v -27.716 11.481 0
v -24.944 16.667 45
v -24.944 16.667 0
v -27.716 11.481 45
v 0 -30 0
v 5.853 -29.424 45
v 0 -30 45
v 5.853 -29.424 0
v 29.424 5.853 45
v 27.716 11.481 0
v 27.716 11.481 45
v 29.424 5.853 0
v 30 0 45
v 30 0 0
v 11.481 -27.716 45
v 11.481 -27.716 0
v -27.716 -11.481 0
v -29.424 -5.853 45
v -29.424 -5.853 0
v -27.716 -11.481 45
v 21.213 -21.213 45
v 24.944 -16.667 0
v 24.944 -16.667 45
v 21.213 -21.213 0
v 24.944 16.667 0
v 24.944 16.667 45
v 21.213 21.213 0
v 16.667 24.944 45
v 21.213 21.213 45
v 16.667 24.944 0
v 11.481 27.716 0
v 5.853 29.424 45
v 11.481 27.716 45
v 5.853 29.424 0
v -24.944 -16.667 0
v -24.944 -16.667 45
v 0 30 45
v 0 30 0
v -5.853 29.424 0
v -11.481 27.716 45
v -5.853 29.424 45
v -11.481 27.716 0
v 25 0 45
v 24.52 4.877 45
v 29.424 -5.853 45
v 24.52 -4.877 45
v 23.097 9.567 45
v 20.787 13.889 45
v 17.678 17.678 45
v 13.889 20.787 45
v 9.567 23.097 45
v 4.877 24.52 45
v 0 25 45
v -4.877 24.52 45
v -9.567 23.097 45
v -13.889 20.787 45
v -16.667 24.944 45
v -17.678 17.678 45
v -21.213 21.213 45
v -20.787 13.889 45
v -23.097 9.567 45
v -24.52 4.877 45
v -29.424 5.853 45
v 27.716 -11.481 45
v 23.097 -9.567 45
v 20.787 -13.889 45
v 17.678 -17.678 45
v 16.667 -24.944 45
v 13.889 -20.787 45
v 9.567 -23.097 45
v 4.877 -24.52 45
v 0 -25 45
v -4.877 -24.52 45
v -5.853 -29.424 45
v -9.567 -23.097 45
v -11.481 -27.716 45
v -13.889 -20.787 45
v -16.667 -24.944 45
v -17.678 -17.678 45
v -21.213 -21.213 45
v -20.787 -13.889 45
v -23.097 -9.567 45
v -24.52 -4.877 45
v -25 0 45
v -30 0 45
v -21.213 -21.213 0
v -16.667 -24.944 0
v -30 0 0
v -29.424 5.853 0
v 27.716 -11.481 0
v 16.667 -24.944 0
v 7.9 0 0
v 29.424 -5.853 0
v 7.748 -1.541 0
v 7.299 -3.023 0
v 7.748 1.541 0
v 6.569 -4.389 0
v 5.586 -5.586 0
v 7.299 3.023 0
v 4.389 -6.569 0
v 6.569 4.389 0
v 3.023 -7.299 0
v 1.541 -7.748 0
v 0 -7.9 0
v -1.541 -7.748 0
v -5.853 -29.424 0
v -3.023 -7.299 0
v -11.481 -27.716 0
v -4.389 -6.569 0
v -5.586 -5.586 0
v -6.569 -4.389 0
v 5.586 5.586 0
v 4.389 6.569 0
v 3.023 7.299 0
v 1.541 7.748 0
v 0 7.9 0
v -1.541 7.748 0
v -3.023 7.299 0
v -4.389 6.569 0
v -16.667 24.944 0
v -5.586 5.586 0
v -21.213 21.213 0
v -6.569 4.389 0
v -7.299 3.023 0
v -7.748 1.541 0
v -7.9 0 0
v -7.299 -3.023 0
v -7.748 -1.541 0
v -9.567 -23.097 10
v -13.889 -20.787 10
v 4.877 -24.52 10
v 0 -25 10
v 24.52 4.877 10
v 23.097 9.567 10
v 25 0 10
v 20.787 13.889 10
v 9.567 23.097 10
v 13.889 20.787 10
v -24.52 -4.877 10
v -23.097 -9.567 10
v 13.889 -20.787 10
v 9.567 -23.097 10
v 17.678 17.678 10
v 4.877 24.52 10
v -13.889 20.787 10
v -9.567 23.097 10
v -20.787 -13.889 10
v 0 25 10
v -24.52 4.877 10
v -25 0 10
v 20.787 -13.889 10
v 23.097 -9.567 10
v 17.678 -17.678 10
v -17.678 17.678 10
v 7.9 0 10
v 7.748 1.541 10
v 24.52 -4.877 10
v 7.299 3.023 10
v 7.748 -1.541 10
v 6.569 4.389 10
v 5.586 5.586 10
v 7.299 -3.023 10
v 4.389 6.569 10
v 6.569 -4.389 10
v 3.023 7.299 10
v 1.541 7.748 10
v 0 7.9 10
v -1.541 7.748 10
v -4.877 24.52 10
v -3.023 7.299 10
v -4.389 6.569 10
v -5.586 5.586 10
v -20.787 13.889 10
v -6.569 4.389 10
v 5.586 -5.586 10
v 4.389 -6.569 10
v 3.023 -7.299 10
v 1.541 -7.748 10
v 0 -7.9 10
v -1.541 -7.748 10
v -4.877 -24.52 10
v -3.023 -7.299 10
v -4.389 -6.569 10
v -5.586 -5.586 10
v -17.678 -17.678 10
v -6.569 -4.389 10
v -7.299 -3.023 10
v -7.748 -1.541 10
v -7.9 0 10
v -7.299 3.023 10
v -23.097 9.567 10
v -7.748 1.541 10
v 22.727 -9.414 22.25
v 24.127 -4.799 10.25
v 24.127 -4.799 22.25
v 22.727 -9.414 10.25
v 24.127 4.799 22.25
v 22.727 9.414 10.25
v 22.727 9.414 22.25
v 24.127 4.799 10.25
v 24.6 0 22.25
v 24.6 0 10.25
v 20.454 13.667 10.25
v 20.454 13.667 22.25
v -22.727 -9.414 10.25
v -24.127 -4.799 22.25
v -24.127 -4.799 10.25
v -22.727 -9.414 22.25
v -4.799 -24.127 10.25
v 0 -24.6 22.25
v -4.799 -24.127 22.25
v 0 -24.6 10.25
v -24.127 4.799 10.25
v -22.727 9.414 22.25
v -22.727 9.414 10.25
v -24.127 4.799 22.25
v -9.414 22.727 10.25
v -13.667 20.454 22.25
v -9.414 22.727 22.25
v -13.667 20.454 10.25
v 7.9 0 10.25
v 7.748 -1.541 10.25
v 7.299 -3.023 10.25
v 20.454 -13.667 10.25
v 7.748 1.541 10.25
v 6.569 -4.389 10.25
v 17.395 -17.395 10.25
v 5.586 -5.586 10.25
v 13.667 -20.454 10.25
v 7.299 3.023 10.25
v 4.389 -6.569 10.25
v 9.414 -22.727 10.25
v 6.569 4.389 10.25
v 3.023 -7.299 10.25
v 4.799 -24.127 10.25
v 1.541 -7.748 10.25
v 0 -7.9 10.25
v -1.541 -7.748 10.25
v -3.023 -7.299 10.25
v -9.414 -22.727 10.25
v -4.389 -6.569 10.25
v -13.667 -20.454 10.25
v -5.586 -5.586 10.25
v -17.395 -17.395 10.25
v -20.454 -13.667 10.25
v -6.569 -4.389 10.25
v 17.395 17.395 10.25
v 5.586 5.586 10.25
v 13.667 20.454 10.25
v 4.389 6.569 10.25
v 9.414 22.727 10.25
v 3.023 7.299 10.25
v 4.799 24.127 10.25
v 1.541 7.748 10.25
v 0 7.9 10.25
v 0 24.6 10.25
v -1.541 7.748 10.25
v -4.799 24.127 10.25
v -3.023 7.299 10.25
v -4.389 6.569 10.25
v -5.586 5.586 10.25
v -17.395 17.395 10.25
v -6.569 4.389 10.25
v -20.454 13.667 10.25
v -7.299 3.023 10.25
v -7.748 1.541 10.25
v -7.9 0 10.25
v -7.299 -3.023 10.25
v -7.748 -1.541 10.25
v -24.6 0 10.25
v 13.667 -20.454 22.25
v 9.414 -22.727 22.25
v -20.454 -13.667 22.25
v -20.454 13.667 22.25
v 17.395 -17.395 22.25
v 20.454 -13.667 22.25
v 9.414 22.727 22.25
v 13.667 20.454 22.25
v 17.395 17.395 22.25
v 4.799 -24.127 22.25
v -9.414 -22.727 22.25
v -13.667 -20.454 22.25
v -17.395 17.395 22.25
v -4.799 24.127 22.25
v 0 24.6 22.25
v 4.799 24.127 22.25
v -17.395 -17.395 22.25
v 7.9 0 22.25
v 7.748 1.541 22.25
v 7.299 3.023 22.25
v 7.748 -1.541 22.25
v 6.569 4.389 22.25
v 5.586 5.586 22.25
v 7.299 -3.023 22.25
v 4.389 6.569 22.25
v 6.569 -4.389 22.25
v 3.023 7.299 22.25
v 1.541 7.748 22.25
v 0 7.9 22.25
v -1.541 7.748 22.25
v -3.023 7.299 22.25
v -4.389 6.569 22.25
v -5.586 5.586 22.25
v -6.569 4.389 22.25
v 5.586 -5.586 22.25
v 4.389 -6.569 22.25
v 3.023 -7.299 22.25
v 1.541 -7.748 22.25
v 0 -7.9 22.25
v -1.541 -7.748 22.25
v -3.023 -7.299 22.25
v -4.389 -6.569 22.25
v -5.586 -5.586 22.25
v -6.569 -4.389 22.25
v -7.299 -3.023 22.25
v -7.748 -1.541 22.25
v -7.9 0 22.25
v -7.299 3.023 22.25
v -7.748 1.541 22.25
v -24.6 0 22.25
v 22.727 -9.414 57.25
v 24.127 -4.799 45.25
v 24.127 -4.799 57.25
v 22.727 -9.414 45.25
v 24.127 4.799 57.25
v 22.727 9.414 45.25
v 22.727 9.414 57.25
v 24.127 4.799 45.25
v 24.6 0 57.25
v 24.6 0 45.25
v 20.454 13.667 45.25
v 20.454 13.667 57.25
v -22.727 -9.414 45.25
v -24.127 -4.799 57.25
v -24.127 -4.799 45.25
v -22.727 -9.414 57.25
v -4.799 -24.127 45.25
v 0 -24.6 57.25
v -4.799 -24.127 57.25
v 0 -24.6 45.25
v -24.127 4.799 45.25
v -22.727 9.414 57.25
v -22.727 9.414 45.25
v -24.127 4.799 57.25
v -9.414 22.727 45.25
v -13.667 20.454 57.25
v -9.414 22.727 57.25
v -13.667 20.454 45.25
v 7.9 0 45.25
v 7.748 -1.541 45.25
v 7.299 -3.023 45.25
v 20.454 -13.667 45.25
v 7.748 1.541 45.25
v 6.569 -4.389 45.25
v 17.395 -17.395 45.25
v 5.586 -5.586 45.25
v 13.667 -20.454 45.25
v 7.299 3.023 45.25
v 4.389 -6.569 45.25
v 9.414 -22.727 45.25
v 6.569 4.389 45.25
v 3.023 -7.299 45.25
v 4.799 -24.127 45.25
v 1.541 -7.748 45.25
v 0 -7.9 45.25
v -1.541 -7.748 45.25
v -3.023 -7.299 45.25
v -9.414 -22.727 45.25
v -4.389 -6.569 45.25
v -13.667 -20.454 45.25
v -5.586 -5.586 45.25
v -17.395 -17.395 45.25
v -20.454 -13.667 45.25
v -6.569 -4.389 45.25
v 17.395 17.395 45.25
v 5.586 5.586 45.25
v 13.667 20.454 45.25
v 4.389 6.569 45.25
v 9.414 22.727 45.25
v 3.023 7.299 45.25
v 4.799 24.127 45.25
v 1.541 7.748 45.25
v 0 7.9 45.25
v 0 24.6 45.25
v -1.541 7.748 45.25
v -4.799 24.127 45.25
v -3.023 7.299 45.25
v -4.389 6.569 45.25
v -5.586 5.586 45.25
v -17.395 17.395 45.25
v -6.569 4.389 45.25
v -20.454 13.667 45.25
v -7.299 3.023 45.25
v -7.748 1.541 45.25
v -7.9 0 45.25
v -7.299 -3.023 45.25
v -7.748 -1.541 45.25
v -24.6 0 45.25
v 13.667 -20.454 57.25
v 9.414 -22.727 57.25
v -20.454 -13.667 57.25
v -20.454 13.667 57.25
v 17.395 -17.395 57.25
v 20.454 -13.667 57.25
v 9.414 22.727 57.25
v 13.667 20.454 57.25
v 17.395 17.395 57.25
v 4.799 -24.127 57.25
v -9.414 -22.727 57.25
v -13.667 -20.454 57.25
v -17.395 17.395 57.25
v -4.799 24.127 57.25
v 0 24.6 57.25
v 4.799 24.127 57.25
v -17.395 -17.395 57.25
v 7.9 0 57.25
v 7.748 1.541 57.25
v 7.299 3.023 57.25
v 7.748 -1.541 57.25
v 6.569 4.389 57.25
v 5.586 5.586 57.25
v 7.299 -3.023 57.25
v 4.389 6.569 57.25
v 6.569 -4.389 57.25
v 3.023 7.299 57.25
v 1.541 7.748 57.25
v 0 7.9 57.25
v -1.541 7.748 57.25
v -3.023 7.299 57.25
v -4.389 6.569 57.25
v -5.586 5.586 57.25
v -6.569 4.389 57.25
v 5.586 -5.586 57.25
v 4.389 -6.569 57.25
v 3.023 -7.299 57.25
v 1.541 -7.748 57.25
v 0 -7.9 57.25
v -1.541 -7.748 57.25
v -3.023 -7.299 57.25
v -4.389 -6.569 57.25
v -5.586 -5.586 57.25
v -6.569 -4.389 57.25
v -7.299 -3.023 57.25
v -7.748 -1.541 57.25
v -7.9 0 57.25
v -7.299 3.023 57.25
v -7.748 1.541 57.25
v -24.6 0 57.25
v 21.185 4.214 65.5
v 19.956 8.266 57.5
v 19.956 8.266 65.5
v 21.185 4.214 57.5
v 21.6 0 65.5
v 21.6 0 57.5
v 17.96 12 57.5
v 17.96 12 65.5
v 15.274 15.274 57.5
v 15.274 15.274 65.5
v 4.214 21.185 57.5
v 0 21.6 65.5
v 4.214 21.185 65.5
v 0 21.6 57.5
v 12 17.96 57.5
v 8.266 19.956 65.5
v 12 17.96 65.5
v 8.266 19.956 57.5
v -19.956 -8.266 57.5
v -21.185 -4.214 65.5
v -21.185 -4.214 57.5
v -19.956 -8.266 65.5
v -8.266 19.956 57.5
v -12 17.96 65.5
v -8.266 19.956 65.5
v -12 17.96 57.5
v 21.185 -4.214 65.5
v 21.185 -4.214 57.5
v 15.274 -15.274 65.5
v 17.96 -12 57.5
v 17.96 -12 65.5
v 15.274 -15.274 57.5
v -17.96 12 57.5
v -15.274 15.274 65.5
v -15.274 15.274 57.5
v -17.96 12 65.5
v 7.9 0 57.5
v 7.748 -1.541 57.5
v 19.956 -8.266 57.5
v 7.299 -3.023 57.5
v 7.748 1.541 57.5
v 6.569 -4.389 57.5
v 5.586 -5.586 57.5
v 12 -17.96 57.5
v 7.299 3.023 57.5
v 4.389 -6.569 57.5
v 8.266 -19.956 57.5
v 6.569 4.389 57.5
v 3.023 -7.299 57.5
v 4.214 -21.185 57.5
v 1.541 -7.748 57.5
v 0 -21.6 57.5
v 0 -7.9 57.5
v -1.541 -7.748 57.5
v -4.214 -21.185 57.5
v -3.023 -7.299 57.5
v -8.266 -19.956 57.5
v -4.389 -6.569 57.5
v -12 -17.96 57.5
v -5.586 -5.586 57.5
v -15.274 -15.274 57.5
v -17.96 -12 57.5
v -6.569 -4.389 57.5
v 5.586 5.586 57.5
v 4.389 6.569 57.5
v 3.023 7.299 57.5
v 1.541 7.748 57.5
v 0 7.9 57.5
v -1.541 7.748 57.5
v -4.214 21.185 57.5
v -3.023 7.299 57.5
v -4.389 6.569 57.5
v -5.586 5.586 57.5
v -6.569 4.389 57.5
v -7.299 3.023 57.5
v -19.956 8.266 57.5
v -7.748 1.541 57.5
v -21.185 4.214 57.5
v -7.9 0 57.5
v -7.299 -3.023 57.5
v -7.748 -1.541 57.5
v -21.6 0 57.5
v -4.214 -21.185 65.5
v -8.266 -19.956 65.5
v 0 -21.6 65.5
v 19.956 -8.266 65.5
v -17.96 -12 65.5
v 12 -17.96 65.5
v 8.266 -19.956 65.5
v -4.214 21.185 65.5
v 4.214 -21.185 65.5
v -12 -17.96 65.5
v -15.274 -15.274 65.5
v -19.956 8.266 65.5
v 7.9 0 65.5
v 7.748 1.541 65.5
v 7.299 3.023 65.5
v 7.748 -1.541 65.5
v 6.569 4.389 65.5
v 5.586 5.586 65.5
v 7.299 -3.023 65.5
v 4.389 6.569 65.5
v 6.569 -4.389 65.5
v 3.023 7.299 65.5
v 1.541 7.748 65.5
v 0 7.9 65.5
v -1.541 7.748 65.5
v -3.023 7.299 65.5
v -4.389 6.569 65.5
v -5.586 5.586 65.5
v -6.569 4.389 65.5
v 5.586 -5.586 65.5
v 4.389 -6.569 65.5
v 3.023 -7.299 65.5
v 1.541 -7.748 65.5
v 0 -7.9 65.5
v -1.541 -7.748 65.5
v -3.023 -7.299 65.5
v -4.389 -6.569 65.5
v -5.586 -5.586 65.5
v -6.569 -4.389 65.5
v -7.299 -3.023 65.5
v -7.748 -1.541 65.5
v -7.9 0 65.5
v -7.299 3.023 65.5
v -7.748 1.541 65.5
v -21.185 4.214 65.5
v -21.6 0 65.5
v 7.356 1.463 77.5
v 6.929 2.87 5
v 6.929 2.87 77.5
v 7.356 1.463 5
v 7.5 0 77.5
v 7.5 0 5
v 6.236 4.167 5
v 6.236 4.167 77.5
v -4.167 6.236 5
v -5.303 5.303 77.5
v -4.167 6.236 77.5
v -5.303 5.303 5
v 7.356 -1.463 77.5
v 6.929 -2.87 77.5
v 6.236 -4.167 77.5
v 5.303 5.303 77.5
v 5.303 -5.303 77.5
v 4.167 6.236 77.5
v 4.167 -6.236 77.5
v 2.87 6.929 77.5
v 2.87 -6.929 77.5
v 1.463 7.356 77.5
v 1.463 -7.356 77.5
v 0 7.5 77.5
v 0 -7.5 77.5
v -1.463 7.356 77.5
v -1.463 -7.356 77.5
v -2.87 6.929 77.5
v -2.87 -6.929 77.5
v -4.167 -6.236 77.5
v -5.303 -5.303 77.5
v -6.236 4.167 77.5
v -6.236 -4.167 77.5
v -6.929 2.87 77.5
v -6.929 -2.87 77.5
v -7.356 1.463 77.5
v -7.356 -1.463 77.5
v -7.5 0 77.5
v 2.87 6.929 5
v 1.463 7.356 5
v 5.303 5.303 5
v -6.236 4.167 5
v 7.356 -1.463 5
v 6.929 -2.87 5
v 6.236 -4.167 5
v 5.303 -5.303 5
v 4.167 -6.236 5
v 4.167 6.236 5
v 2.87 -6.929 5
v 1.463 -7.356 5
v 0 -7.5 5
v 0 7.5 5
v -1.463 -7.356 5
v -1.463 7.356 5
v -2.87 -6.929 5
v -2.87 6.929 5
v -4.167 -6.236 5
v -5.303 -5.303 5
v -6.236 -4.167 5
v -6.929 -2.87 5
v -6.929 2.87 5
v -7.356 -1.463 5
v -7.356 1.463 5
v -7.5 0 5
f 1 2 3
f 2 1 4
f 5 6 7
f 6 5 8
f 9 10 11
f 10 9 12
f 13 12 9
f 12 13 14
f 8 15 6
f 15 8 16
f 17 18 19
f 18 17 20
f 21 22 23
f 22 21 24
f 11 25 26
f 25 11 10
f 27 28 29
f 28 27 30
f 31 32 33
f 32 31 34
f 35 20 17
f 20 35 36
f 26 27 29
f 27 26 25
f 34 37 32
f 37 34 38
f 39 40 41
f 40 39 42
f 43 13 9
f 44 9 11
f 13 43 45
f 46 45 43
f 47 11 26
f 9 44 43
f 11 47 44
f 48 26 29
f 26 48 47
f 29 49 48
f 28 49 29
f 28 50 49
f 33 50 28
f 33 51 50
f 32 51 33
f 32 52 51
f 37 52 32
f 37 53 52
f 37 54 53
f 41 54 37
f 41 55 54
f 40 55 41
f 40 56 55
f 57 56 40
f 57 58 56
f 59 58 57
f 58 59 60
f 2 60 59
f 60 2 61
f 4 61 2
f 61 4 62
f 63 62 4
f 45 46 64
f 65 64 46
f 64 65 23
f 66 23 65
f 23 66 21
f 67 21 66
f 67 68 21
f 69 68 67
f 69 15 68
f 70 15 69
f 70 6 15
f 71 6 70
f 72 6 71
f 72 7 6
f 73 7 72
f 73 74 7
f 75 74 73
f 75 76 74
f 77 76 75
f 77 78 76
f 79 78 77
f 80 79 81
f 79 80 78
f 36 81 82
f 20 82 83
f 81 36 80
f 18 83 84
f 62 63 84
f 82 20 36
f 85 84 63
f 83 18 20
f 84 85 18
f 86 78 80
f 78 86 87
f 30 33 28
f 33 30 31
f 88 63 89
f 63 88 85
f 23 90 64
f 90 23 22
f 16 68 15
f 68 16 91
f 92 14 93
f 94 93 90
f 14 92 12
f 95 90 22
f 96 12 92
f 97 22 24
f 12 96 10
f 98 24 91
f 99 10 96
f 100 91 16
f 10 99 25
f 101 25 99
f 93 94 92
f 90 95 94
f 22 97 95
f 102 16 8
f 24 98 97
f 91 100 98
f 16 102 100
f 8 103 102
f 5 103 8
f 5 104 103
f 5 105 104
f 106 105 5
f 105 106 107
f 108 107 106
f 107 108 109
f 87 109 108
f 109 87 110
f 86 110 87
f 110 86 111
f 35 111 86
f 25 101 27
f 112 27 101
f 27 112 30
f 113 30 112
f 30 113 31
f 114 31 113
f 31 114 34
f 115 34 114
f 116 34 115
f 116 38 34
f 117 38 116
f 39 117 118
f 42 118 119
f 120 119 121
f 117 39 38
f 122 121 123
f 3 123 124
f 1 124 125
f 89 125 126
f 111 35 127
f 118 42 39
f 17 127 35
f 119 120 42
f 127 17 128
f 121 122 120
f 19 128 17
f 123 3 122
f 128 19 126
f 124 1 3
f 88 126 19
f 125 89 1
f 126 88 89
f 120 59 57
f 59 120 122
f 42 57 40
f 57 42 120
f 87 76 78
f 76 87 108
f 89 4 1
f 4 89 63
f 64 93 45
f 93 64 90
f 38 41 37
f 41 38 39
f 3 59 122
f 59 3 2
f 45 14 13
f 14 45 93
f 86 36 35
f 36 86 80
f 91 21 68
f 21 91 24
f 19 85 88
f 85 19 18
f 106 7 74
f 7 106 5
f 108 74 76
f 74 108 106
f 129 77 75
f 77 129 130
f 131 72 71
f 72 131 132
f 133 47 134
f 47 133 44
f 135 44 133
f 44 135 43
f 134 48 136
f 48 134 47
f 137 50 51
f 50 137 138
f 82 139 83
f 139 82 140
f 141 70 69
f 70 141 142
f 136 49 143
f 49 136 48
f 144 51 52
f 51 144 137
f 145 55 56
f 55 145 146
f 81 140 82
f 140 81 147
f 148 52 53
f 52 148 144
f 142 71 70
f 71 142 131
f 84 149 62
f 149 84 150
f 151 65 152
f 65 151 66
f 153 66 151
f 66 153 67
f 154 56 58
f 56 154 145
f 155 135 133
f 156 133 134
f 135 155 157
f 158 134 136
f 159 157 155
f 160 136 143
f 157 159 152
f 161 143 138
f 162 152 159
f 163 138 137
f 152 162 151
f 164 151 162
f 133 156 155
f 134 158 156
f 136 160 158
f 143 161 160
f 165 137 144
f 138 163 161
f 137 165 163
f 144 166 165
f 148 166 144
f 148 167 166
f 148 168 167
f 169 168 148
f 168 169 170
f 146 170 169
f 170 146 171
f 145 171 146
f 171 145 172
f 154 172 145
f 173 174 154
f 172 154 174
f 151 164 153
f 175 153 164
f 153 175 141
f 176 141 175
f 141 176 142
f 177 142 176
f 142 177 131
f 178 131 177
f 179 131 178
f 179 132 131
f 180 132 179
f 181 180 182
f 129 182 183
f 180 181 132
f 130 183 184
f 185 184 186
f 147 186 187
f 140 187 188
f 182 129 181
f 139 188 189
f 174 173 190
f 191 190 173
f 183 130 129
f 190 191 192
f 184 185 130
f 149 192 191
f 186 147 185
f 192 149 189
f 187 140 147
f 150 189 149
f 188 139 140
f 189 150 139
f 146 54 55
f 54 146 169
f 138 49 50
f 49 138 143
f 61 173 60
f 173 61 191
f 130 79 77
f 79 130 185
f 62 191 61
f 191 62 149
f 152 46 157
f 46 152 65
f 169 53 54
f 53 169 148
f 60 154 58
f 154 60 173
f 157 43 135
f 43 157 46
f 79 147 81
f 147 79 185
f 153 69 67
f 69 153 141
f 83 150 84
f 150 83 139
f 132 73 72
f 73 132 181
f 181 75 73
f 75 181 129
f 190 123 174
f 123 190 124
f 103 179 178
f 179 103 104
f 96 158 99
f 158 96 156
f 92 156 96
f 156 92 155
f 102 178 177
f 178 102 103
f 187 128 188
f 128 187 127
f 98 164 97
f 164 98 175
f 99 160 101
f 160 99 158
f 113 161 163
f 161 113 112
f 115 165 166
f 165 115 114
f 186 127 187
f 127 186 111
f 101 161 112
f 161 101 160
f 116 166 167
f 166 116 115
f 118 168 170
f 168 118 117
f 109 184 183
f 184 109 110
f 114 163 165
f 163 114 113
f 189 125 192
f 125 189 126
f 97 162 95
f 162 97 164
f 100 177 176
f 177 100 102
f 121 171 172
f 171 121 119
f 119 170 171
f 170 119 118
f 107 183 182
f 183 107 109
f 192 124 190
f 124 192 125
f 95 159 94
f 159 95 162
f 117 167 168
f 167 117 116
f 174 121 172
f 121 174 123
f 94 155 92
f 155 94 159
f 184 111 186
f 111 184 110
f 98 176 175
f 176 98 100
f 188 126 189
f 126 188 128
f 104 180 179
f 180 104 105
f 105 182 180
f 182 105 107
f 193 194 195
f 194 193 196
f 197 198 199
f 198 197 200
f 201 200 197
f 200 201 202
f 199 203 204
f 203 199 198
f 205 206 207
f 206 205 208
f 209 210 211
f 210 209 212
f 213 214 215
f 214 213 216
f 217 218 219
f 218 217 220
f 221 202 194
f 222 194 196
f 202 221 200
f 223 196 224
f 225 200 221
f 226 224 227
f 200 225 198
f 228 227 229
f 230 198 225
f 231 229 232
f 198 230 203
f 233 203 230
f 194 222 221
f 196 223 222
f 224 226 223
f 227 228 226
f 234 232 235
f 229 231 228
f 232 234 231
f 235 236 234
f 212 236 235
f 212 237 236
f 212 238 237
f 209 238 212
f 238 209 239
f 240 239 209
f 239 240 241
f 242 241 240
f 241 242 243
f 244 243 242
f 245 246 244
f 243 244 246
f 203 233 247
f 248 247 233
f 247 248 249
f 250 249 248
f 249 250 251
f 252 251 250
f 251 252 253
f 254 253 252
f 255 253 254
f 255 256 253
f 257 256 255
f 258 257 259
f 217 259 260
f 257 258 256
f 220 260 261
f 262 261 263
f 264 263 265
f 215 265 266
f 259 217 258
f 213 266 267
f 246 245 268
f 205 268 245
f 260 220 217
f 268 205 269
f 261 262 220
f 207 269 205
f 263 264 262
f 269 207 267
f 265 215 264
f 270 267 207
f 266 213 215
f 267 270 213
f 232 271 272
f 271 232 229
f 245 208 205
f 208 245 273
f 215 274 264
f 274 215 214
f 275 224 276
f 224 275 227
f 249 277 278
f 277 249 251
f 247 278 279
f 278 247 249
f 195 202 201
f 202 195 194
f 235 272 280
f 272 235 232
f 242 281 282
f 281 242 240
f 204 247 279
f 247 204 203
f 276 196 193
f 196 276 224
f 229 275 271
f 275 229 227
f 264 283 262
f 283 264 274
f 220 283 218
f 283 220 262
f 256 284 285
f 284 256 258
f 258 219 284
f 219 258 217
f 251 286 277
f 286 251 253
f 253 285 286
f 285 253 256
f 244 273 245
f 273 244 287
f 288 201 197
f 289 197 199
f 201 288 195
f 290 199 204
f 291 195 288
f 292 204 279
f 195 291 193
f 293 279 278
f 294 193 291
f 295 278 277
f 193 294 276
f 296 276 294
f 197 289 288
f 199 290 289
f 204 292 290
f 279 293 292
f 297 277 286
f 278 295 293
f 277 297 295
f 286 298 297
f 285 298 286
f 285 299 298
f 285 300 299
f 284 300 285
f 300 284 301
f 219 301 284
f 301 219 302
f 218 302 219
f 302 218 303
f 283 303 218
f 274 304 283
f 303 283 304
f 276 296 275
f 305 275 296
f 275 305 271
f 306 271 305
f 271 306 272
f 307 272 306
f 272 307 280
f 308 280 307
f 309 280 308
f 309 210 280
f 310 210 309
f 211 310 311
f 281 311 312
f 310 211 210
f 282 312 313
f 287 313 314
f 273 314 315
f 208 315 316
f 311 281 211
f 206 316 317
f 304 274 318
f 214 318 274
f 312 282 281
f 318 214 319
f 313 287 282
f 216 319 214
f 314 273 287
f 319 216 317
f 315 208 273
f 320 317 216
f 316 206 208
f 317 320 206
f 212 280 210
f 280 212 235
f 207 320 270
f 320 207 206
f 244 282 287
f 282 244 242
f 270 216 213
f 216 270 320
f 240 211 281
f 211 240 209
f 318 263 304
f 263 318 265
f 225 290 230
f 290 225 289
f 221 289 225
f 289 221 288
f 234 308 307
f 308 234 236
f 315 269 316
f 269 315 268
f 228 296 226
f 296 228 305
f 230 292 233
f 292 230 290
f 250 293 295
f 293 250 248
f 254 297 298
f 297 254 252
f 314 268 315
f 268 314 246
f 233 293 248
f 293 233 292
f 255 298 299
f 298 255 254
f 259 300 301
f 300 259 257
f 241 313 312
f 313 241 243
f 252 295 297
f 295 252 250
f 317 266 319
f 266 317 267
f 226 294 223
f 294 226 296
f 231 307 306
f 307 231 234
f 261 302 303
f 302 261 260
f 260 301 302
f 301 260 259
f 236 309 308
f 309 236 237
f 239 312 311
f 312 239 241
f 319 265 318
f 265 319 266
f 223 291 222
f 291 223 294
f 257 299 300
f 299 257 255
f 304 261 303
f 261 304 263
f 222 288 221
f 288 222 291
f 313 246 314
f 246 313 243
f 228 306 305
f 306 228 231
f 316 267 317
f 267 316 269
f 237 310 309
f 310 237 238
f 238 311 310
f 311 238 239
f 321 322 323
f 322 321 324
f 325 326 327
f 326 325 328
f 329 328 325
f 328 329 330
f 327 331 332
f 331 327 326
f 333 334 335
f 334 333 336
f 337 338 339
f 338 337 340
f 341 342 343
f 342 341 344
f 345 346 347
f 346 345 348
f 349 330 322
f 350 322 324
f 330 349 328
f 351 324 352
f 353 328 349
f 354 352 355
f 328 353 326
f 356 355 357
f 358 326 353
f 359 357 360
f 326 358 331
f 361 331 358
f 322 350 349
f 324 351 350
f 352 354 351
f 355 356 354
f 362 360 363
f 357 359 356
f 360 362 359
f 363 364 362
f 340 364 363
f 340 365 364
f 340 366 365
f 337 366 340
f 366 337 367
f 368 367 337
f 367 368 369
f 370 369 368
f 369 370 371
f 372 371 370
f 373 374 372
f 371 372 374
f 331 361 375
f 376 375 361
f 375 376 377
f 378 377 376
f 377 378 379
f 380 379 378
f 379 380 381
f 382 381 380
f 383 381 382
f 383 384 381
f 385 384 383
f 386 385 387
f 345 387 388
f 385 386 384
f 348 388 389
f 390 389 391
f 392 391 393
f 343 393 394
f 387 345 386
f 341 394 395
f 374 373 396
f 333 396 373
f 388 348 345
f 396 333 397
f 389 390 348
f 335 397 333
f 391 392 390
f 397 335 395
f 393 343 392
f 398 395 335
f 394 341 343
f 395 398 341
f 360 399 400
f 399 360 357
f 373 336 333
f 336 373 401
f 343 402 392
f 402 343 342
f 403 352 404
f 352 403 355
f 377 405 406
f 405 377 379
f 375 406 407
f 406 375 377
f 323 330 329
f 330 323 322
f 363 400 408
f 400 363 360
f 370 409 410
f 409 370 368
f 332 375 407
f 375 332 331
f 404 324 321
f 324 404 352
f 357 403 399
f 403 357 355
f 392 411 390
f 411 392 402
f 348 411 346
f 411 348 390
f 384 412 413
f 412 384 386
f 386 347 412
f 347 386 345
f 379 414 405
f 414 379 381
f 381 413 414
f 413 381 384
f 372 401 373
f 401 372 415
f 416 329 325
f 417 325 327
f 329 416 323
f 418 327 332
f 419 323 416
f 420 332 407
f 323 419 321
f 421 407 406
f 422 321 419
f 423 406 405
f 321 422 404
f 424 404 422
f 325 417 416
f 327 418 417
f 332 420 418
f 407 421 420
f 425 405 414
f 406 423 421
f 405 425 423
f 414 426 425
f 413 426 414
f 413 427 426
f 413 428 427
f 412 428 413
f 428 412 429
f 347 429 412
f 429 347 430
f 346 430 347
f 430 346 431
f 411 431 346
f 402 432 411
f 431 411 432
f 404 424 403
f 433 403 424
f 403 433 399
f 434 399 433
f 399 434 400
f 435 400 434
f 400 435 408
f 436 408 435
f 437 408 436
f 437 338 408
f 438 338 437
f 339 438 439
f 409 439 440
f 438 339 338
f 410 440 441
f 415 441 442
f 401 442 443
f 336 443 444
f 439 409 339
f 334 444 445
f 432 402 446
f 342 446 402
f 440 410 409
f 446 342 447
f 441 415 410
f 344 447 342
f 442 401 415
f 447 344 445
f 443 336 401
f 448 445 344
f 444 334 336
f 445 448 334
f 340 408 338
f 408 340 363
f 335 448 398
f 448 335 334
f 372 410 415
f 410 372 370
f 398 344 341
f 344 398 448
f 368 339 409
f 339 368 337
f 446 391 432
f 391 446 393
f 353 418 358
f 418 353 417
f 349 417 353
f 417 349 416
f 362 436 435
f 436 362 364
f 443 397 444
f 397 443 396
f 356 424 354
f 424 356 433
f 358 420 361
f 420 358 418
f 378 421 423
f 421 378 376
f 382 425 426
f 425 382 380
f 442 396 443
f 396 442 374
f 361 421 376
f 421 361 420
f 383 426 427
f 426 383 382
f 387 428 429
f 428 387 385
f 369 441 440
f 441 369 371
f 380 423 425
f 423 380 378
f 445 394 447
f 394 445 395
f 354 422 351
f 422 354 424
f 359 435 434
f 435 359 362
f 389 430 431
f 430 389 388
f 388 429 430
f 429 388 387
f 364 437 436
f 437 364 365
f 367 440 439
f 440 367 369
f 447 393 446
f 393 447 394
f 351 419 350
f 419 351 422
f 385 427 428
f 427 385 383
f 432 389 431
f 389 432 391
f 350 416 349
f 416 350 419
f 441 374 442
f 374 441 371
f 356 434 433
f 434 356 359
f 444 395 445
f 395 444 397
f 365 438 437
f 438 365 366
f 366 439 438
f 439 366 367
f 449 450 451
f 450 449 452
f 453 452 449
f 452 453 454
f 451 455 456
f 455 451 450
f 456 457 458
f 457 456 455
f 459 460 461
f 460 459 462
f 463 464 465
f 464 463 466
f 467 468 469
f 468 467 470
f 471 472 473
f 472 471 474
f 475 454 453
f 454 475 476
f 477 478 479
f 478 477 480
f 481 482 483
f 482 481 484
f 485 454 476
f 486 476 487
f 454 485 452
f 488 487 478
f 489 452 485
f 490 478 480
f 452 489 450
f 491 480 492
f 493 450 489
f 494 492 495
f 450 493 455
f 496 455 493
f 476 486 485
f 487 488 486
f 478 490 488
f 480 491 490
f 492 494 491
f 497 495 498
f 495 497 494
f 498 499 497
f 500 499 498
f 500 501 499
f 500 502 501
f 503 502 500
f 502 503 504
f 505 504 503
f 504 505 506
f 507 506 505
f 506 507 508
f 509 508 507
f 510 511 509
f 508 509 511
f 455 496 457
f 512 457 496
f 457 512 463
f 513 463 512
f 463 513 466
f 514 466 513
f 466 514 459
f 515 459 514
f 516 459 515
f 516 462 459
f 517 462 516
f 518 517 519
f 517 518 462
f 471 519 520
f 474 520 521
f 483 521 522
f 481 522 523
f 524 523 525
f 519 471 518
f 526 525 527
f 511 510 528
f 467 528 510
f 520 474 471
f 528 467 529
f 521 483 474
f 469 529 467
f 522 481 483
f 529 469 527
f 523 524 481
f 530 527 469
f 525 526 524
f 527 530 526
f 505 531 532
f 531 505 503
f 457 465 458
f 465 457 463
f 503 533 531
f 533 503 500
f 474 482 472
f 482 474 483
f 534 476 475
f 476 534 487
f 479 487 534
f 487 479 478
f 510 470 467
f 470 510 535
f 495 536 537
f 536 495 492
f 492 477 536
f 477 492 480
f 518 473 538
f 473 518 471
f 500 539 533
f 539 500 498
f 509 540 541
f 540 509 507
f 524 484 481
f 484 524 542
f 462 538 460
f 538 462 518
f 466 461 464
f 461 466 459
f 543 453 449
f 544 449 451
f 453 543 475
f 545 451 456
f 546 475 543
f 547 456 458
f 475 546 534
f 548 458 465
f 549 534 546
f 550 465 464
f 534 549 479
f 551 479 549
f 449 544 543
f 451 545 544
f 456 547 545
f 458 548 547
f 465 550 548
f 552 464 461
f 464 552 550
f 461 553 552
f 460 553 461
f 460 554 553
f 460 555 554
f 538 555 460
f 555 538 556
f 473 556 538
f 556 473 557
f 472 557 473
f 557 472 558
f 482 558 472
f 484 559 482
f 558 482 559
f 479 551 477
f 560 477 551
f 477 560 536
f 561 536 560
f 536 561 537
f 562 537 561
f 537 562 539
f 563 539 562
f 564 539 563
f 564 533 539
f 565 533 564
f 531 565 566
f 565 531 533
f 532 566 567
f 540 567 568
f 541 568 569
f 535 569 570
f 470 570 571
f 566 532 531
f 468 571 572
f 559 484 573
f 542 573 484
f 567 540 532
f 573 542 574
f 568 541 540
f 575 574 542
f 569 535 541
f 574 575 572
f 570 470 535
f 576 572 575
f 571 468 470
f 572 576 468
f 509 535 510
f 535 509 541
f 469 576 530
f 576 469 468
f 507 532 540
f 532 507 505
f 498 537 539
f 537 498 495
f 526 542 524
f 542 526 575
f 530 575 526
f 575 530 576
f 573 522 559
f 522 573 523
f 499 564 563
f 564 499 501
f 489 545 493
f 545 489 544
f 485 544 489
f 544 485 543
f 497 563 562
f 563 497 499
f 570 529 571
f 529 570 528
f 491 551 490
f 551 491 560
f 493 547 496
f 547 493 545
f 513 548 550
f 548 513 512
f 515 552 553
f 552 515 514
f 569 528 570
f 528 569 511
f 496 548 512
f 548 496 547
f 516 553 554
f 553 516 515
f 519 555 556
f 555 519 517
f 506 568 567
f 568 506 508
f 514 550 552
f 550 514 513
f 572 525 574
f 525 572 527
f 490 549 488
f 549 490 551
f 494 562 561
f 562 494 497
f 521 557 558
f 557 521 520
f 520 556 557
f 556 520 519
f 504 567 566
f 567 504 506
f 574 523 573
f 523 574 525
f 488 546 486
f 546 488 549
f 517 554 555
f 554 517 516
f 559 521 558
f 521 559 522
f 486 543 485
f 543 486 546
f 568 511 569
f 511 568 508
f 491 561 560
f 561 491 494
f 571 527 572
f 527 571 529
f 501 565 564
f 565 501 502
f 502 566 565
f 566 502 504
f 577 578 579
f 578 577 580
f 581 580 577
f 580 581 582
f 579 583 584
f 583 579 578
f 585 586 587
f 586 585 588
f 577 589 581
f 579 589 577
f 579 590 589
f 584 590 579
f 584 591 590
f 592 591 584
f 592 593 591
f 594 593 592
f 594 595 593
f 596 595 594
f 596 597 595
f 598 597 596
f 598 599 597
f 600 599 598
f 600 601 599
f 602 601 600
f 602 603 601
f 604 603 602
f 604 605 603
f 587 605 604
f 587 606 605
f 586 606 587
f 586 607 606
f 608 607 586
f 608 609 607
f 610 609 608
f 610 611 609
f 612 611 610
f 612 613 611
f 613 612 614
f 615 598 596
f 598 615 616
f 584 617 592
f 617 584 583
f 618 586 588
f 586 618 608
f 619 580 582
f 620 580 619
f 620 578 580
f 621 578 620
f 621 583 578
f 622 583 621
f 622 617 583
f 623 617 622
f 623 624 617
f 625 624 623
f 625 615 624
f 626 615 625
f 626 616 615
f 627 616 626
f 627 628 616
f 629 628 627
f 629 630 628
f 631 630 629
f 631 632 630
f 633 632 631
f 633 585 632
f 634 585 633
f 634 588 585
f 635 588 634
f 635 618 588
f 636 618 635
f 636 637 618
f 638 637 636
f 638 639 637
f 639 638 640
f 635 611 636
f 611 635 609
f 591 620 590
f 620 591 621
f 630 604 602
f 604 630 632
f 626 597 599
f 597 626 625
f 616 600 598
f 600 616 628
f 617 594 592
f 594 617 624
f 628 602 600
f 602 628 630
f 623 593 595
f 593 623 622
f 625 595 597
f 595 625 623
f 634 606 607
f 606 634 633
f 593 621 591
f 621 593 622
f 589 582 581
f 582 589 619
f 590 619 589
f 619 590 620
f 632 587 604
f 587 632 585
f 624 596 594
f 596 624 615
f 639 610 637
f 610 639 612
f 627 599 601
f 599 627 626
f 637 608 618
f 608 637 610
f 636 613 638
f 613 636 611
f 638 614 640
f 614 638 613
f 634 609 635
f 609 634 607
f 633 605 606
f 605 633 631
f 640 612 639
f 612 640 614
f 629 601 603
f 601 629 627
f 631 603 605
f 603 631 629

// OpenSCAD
$fn = 32;

// ------------------------------------------------------------------------
// Bearing housing: housing d60, two bearings and a shaft
// Every part is its own module, assembly() places them once.
// ------------------------------------------------------------------------

// --- part 1 ---
module housing() {
  difference() {
    cylinder(h = 45, d = 60);
    translate([0, 0, 10]) cylinder(h = 36, d = 50);
    translate([0, 0, -1]) cylinder(h = 12, d = 15.8);
  }
}

// --- part 2 ---
module bearing_lower() {
  difference() {
      translate([0, 0, 0]) cylinder(h = 12, d = 49.2);
      translate([0, 0, -1]) cylinder(h = 14, d = 15.8);
    }
}

// --- part 3 ---
module bearing_upper() {
  difference() {
      translate([0, 0, 0]) cylinder(h = 12, d = 49.2);
      translate([0, 0, -1]) cylinder(h = 14, d = 15.8);
    }
}

// --- part 4 ---
module spacer() {
  difference() {
      translate([0, 0, 0]) cylinder(h = 8, d = 43.2);
      translate([0, 0, -1]) cylinder(h = 10, d = 15.8);
    }
}

// --- part 5 ---
module shaft() {
  translate([0, 0, -36.25]) cylinder(h = 72.5, d = 15);
}

// --- assembly ---
module assembly() {
  translate([0, 0, 0]) rotate([0, 0, 0]) housing();
  translate([0, 0, 10.25]) rotate([0, 0, 0]) bearing_lower();
  translate([0, 0, 45.25]) rotate([0, 0, 0]) bearing_upper();
  translate([0, 0, 57.5]) rotate([0, 0, 0]) spacer();
  translate([0, 0, 41.25]) rotate([0, 0, 0]) shaft();
}

assembly();
